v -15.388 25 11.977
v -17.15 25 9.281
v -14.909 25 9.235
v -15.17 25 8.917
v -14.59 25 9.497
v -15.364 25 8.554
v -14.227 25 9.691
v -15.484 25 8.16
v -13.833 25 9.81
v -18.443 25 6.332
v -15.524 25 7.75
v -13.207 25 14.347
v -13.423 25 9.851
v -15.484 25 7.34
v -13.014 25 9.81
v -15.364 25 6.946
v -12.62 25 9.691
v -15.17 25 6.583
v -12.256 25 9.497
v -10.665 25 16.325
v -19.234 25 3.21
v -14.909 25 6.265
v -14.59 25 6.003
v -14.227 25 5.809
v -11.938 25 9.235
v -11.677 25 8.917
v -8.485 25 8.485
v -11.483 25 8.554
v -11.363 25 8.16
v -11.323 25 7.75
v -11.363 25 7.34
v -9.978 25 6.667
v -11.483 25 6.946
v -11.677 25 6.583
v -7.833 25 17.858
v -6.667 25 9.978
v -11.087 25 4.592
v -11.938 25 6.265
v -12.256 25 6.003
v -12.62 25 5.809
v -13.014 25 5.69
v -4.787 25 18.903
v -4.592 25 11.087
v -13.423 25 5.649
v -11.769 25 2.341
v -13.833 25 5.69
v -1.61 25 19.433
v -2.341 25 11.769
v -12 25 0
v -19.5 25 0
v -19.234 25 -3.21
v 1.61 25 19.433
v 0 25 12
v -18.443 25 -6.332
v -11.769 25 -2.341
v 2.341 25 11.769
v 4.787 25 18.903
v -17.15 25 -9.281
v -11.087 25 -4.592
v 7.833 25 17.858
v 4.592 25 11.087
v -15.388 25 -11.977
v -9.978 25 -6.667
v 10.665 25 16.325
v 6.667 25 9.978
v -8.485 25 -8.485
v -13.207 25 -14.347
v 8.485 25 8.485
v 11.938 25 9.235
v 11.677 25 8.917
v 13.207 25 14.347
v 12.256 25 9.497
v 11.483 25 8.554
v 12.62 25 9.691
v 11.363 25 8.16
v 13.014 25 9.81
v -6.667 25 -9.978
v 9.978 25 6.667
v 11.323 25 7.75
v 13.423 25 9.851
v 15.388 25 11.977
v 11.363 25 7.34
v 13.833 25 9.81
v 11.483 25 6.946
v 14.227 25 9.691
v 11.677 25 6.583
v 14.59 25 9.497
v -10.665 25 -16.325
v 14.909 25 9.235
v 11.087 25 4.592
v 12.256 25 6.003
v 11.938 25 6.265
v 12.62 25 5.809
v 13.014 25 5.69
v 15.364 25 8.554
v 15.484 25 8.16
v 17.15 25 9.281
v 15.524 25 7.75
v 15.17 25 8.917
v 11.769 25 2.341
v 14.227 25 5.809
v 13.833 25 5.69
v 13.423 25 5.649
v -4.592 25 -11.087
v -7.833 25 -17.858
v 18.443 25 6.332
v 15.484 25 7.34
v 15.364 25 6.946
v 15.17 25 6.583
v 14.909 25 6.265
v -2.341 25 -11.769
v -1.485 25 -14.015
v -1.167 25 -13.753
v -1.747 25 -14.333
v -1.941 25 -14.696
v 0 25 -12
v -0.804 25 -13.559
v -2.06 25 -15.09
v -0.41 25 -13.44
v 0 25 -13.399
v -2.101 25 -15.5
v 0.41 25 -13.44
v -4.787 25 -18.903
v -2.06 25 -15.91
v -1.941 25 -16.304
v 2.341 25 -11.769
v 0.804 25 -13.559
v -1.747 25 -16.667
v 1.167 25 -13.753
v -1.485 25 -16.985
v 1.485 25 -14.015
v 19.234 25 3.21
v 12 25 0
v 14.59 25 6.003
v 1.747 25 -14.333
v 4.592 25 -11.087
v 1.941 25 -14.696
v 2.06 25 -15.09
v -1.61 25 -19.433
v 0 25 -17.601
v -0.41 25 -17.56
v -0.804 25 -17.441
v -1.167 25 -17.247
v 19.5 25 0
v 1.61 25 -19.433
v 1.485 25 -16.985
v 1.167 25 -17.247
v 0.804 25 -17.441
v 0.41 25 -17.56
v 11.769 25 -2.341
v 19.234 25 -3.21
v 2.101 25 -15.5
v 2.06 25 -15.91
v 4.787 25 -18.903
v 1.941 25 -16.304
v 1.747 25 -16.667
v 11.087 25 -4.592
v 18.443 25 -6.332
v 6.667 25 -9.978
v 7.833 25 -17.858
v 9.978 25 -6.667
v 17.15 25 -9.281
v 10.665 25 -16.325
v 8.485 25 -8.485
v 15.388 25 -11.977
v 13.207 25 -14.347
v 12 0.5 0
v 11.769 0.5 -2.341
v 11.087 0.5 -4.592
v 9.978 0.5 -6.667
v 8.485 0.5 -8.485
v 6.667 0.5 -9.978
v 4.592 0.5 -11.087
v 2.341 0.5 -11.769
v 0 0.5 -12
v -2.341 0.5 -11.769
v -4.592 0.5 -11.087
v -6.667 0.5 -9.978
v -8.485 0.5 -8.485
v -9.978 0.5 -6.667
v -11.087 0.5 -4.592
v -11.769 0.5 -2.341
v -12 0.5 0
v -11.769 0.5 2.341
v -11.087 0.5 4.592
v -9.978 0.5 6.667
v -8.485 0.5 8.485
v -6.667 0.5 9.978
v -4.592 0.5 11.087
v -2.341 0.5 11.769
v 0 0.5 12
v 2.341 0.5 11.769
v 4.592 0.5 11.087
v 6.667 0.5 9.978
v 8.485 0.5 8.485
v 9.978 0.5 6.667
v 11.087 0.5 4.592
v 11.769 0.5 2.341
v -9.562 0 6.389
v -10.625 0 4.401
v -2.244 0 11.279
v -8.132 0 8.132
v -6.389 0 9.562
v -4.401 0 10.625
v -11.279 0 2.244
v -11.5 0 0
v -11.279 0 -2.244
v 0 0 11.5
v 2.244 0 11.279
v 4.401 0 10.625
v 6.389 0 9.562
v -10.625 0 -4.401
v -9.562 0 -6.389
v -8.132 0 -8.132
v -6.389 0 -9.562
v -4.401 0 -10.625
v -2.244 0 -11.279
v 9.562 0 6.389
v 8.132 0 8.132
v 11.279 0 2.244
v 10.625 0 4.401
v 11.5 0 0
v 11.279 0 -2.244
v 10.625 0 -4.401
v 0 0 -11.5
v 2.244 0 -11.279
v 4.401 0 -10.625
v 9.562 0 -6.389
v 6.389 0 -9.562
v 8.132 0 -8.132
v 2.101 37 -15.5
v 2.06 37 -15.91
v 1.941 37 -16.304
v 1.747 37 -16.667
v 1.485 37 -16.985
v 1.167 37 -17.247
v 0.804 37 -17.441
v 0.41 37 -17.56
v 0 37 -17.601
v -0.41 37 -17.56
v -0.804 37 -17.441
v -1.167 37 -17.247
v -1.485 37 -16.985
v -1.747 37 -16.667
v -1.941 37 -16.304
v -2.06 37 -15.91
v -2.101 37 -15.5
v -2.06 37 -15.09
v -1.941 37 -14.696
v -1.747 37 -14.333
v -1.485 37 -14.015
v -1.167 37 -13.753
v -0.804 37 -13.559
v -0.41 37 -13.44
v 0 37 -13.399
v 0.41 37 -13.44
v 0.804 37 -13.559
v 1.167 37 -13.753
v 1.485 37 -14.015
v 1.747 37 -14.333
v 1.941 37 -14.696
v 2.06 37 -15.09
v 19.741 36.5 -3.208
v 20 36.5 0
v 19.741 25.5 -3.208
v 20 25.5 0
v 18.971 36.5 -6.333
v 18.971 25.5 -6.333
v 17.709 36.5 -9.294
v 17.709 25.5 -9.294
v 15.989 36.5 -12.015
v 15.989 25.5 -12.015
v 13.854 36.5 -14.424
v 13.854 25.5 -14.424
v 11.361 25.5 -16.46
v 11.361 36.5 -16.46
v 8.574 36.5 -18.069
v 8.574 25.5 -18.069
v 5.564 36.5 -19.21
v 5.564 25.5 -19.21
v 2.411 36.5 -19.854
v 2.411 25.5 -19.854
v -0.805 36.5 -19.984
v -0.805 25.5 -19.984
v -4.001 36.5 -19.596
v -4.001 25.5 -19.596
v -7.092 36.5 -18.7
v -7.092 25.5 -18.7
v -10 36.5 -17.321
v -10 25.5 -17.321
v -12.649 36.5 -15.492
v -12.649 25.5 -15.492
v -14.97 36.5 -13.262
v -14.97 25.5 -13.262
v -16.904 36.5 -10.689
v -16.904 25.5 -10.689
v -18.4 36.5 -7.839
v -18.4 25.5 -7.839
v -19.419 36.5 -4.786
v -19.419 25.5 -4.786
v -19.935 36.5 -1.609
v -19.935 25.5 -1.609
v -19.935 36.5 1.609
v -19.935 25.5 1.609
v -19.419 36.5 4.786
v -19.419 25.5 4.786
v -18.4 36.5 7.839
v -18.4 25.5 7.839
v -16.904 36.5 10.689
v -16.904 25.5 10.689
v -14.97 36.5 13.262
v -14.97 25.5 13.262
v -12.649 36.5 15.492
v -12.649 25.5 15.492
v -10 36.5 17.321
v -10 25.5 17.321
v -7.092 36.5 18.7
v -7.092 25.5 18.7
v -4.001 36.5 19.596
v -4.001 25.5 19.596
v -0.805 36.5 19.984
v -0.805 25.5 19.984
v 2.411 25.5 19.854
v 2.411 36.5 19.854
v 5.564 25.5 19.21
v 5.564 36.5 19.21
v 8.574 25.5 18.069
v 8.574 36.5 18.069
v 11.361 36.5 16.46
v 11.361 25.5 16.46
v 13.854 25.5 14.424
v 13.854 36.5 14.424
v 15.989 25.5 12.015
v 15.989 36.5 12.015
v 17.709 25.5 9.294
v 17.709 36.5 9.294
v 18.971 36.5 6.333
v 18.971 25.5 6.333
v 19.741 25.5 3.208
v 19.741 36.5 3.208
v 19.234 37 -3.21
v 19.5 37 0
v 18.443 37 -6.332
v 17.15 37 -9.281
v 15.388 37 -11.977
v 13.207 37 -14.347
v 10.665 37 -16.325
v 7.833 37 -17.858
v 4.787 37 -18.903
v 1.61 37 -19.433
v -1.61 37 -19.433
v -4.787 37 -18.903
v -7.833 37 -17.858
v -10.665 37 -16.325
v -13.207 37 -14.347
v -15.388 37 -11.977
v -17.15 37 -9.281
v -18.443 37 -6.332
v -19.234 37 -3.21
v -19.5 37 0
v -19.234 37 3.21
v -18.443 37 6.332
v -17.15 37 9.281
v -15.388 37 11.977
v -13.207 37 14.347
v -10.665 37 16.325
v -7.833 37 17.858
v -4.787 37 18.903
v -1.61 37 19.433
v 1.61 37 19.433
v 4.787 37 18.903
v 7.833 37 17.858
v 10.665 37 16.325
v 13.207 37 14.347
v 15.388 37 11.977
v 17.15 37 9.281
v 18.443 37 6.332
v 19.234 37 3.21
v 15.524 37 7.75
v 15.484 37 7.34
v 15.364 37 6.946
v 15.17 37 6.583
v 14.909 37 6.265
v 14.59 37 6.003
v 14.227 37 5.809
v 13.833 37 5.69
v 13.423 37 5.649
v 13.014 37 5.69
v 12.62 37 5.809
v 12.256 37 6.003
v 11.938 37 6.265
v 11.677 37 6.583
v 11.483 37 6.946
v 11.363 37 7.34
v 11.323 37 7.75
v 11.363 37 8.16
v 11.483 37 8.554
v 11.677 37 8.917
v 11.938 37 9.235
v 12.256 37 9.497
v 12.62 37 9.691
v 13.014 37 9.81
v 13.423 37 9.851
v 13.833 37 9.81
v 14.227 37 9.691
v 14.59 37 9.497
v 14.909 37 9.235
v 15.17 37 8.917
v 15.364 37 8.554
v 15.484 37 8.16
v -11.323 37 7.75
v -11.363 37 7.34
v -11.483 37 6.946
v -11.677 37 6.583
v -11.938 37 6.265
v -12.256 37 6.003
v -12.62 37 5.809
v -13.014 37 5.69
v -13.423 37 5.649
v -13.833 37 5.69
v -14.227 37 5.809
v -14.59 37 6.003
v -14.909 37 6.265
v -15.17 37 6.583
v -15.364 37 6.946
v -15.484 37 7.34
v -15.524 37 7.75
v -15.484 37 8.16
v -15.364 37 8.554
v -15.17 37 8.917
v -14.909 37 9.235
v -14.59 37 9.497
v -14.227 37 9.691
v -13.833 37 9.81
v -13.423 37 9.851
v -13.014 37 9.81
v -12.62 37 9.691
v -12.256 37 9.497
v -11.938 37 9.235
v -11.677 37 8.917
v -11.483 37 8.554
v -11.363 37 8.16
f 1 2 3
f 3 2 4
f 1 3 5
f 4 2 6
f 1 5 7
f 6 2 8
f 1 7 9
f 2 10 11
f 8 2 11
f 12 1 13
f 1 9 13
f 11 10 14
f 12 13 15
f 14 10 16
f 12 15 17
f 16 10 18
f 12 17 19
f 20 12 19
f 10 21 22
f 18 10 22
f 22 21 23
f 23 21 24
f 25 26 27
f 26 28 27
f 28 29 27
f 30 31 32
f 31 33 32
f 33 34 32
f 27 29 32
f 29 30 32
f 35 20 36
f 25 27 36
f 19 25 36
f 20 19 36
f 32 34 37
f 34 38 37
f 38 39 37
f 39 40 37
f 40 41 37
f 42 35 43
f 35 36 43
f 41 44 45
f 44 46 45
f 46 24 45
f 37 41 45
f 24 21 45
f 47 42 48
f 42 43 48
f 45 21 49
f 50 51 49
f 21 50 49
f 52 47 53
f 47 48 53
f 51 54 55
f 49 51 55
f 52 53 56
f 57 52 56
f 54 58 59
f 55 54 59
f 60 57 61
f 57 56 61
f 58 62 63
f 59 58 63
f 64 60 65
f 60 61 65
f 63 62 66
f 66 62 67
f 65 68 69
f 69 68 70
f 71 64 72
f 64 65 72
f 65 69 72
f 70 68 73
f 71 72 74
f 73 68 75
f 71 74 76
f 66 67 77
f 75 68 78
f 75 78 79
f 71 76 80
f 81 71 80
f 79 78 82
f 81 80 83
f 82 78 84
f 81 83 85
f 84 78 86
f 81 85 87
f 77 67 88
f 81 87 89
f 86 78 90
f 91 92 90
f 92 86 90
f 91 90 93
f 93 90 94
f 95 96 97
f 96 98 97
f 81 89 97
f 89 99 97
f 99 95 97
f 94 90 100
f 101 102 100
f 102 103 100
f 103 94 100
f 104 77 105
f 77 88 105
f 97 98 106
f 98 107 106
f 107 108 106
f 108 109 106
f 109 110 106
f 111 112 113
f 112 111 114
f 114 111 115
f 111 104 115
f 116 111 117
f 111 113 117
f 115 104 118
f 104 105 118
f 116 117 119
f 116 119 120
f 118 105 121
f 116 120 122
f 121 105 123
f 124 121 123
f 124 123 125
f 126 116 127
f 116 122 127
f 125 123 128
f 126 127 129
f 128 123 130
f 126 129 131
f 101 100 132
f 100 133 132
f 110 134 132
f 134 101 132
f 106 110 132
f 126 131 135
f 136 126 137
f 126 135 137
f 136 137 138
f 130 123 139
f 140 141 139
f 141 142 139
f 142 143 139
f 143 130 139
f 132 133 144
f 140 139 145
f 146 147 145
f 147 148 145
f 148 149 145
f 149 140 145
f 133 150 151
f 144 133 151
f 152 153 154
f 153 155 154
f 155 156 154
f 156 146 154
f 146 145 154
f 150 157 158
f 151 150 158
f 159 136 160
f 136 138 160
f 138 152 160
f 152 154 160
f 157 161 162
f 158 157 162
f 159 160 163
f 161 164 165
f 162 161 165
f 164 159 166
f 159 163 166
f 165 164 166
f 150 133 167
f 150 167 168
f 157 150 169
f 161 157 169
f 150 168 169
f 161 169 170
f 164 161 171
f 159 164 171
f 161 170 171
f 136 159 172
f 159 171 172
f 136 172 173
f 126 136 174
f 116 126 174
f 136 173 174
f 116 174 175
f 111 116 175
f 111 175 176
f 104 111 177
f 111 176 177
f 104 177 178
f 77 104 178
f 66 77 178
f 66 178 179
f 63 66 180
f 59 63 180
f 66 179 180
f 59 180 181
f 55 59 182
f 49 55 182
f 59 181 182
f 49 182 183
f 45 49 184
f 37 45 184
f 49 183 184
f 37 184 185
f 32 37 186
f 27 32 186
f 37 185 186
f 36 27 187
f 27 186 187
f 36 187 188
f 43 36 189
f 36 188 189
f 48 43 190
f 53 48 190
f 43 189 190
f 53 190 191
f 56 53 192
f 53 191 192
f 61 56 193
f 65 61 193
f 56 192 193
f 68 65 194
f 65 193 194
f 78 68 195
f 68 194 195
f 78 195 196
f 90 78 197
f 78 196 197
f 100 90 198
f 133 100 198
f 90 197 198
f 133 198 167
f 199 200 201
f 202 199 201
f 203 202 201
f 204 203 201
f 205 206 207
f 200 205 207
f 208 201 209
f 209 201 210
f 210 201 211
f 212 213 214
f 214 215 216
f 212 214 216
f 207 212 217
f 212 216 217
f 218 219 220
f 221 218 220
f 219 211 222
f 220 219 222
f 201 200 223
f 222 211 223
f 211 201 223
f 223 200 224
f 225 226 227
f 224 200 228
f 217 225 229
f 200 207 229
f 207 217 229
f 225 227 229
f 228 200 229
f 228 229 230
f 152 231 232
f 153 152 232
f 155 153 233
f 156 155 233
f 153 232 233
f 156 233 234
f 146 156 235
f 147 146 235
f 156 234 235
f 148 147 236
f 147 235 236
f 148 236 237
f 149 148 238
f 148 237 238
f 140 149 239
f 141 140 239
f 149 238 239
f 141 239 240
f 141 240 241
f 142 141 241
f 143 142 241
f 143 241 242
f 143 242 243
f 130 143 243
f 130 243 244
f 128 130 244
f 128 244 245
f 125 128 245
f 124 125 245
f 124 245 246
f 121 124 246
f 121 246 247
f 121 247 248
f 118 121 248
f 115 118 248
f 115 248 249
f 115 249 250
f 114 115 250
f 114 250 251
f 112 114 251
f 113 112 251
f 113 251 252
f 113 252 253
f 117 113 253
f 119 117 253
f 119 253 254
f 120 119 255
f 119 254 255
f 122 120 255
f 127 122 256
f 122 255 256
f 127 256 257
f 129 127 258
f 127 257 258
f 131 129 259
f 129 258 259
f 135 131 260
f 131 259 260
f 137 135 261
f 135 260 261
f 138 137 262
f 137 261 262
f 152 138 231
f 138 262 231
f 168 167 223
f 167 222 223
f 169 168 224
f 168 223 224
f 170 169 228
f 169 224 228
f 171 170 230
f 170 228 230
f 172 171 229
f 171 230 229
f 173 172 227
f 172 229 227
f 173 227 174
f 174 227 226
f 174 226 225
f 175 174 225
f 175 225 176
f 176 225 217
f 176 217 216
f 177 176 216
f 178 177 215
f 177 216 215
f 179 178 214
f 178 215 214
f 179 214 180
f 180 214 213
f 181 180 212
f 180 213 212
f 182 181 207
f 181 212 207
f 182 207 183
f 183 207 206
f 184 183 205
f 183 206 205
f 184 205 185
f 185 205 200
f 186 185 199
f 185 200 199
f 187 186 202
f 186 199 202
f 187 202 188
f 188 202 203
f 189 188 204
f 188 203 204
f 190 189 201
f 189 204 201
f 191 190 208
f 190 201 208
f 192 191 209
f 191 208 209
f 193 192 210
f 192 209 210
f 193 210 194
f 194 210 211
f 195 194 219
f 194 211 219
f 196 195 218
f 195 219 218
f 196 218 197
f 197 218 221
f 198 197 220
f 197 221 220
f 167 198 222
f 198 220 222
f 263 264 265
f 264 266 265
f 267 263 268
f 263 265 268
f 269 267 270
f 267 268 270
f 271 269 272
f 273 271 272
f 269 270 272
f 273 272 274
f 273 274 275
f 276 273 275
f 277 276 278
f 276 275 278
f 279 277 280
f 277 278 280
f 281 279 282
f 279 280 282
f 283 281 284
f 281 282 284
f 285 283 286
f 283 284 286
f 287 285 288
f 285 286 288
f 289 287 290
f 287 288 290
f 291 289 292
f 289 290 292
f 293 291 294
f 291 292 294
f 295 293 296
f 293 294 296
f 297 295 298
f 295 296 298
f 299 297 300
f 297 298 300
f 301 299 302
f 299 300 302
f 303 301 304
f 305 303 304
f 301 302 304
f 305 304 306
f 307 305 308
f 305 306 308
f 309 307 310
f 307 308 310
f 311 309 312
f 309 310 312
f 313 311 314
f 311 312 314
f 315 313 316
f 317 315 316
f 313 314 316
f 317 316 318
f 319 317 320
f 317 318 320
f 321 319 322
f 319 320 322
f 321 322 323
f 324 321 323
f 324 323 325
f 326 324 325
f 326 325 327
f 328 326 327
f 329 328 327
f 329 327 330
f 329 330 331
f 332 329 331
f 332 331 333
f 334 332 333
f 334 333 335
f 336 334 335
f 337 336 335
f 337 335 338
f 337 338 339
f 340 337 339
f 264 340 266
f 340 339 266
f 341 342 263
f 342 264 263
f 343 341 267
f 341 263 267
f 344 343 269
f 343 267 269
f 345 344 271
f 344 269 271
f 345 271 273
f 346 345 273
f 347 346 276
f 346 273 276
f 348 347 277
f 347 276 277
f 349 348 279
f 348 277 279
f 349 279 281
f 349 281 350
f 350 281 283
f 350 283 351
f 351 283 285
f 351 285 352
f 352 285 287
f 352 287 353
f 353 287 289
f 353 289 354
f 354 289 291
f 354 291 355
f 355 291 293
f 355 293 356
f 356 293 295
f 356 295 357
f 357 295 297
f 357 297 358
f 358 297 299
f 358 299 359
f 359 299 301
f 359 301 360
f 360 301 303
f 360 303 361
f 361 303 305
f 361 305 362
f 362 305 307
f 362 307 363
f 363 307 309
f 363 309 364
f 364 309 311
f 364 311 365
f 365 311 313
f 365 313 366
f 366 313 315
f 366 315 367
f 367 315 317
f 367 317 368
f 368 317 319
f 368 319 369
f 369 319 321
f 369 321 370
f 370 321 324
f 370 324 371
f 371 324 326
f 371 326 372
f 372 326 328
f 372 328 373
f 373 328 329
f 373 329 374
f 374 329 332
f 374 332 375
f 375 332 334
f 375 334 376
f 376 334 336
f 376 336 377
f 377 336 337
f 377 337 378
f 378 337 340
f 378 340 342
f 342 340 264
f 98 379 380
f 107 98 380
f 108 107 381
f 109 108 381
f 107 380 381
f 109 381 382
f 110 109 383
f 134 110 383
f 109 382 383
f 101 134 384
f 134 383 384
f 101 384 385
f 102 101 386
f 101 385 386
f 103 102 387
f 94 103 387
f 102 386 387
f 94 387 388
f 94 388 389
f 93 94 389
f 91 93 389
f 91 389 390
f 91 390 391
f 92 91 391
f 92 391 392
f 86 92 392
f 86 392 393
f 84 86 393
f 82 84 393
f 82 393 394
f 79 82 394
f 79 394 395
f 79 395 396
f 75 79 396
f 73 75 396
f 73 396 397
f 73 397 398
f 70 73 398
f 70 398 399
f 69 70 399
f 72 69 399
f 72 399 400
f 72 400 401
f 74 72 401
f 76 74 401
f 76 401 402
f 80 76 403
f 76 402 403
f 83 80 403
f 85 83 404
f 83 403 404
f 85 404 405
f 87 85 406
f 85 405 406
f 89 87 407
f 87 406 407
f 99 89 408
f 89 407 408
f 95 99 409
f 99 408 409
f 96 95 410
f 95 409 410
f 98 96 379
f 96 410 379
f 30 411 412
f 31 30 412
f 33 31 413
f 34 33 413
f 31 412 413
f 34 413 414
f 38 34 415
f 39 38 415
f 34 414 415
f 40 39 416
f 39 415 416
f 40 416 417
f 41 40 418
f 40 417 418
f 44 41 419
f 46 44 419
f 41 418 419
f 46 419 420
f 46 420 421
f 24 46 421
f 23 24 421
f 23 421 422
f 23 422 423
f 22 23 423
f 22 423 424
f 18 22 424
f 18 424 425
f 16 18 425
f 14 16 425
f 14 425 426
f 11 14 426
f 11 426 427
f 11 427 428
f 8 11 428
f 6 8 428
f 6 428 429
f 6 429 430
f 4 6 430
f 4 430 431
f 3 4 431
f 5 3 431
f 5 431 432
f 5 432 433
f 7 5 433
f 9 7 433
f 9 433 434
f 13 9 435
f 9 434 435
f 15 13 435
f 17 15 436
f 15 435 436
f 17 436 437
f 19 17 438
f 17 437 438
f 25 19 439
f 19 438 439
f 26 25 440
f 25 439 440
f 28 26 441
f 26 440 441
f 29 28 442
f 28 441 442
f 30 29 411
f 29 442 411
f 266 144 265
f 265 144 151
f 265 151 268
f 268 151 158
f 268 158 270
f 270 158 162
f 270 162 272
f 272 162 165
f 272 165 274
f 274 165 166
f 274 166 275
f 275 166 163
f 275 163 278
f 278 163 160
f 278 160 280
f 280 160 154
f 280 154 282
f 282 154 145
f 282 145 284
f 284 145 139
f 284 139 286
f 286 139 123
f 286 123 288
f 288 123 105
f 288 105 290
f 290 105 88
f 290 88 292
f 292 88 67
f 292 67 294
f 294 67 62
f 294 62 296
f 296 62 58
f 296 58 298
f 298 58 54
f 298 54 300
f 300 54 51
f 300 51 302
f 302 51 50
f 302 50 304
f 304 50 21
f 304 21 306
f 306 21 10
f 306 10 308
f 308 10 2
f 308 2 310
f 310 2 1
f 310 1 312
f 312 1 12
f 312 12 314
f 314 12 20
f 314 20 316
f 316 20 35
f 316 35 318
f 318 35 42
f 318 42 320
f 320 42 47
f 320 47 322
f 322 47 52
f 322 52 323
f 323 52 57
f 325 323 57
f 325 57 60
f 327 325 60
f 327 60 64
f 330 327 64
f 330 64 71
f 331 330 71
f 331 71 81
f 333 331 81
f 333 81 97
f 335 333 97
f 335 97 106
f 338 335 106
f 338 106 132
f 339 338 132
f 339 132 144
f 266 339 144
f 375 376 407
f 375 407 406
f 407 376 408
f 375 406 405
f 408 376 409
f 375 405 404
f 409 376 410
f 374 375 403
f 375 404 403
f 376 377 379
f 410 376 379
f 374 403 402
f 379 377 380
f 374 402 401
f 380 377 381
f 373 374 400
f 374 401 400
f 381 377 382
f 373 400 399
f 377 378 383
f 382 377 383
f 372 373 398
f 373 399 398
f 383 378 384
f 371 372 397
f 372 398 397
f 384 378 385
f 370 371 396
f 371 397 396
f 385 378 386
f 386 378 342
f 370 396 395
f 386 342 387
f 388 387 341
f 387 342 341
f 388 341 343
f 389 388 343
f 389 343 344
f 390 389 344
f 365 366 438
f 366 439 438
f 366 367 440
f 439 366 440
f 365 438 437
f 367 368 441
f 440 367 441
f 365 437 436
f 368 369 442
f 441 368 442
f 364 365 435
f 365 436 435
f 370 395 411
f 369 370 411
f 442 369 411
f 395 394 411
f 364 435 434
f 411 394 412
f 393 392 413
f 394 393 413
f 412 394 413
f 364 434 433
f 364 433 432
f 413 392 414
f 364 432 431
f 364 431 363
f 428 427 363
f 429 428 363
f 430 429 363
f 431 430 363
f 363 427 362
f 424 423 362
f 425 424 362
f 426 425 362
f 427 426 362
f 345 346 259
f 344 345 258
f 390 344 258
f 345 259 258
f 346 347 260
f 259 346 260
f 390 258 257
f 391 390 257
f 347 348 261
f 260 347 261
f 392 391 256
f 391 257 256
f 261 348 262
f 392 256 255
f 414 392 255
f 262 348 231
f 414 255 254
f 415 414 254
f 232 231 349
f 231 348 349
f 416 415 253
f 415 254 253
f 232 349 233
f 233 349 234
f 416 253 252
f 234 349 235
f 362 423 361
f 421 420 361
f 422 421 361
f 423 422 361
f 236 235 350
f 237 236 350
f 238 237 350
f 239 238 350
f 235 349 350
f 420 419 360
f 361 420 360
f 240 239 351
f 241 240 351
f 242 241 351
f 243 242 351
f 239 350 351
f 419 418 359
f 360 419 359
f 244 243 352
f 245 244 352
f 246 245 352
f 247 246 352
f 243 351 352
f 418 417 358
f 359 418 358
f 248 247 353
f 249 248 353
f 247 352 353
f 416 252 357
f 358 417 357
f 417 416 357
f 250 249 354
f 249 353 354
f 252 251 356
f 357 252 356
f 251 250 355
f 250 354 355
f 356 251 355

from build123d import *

# Parameters (mm, degrees)
SKETCH2_R          = 2.10058
CUT_EXTRUDE1_DEPTH = 38


with BuildPart() as part:
    # Sketch1 → Revolve1 (revolve)
    with BuildSketch(Plane.XY):
        Polygon((0, 0), (0, 37), (19.5, 37), (20, 36.5), (20, 25.5), (19.5, 25), (12, 25), (12, 0.5), (11.5, 0), align=None)
    revolve(axis=Axis((0, 0, 0), (0, 1, 0)))

    # Sketch2 → Cut-Extrude1 (cut, through all)
    with BuildSketch(Plane(origin=(0, 37, 0), x_dir=(1, 0, 0), z_dir=(0, 1, 0))):
        with Locations((0, 15.5)):
            Circle(SKETCH2_R)
        with Locations((13.423393759, -7.75)):
            Circle(SKETCH2_R)
        with Locations((-13.423393759, -7.75)):
            Circle(SKETCH2_R)
    extrude(amount=-CUT_EXTRUDE1_DEPTH, mode=Mode.SUBTRACT)


solid = part.part
